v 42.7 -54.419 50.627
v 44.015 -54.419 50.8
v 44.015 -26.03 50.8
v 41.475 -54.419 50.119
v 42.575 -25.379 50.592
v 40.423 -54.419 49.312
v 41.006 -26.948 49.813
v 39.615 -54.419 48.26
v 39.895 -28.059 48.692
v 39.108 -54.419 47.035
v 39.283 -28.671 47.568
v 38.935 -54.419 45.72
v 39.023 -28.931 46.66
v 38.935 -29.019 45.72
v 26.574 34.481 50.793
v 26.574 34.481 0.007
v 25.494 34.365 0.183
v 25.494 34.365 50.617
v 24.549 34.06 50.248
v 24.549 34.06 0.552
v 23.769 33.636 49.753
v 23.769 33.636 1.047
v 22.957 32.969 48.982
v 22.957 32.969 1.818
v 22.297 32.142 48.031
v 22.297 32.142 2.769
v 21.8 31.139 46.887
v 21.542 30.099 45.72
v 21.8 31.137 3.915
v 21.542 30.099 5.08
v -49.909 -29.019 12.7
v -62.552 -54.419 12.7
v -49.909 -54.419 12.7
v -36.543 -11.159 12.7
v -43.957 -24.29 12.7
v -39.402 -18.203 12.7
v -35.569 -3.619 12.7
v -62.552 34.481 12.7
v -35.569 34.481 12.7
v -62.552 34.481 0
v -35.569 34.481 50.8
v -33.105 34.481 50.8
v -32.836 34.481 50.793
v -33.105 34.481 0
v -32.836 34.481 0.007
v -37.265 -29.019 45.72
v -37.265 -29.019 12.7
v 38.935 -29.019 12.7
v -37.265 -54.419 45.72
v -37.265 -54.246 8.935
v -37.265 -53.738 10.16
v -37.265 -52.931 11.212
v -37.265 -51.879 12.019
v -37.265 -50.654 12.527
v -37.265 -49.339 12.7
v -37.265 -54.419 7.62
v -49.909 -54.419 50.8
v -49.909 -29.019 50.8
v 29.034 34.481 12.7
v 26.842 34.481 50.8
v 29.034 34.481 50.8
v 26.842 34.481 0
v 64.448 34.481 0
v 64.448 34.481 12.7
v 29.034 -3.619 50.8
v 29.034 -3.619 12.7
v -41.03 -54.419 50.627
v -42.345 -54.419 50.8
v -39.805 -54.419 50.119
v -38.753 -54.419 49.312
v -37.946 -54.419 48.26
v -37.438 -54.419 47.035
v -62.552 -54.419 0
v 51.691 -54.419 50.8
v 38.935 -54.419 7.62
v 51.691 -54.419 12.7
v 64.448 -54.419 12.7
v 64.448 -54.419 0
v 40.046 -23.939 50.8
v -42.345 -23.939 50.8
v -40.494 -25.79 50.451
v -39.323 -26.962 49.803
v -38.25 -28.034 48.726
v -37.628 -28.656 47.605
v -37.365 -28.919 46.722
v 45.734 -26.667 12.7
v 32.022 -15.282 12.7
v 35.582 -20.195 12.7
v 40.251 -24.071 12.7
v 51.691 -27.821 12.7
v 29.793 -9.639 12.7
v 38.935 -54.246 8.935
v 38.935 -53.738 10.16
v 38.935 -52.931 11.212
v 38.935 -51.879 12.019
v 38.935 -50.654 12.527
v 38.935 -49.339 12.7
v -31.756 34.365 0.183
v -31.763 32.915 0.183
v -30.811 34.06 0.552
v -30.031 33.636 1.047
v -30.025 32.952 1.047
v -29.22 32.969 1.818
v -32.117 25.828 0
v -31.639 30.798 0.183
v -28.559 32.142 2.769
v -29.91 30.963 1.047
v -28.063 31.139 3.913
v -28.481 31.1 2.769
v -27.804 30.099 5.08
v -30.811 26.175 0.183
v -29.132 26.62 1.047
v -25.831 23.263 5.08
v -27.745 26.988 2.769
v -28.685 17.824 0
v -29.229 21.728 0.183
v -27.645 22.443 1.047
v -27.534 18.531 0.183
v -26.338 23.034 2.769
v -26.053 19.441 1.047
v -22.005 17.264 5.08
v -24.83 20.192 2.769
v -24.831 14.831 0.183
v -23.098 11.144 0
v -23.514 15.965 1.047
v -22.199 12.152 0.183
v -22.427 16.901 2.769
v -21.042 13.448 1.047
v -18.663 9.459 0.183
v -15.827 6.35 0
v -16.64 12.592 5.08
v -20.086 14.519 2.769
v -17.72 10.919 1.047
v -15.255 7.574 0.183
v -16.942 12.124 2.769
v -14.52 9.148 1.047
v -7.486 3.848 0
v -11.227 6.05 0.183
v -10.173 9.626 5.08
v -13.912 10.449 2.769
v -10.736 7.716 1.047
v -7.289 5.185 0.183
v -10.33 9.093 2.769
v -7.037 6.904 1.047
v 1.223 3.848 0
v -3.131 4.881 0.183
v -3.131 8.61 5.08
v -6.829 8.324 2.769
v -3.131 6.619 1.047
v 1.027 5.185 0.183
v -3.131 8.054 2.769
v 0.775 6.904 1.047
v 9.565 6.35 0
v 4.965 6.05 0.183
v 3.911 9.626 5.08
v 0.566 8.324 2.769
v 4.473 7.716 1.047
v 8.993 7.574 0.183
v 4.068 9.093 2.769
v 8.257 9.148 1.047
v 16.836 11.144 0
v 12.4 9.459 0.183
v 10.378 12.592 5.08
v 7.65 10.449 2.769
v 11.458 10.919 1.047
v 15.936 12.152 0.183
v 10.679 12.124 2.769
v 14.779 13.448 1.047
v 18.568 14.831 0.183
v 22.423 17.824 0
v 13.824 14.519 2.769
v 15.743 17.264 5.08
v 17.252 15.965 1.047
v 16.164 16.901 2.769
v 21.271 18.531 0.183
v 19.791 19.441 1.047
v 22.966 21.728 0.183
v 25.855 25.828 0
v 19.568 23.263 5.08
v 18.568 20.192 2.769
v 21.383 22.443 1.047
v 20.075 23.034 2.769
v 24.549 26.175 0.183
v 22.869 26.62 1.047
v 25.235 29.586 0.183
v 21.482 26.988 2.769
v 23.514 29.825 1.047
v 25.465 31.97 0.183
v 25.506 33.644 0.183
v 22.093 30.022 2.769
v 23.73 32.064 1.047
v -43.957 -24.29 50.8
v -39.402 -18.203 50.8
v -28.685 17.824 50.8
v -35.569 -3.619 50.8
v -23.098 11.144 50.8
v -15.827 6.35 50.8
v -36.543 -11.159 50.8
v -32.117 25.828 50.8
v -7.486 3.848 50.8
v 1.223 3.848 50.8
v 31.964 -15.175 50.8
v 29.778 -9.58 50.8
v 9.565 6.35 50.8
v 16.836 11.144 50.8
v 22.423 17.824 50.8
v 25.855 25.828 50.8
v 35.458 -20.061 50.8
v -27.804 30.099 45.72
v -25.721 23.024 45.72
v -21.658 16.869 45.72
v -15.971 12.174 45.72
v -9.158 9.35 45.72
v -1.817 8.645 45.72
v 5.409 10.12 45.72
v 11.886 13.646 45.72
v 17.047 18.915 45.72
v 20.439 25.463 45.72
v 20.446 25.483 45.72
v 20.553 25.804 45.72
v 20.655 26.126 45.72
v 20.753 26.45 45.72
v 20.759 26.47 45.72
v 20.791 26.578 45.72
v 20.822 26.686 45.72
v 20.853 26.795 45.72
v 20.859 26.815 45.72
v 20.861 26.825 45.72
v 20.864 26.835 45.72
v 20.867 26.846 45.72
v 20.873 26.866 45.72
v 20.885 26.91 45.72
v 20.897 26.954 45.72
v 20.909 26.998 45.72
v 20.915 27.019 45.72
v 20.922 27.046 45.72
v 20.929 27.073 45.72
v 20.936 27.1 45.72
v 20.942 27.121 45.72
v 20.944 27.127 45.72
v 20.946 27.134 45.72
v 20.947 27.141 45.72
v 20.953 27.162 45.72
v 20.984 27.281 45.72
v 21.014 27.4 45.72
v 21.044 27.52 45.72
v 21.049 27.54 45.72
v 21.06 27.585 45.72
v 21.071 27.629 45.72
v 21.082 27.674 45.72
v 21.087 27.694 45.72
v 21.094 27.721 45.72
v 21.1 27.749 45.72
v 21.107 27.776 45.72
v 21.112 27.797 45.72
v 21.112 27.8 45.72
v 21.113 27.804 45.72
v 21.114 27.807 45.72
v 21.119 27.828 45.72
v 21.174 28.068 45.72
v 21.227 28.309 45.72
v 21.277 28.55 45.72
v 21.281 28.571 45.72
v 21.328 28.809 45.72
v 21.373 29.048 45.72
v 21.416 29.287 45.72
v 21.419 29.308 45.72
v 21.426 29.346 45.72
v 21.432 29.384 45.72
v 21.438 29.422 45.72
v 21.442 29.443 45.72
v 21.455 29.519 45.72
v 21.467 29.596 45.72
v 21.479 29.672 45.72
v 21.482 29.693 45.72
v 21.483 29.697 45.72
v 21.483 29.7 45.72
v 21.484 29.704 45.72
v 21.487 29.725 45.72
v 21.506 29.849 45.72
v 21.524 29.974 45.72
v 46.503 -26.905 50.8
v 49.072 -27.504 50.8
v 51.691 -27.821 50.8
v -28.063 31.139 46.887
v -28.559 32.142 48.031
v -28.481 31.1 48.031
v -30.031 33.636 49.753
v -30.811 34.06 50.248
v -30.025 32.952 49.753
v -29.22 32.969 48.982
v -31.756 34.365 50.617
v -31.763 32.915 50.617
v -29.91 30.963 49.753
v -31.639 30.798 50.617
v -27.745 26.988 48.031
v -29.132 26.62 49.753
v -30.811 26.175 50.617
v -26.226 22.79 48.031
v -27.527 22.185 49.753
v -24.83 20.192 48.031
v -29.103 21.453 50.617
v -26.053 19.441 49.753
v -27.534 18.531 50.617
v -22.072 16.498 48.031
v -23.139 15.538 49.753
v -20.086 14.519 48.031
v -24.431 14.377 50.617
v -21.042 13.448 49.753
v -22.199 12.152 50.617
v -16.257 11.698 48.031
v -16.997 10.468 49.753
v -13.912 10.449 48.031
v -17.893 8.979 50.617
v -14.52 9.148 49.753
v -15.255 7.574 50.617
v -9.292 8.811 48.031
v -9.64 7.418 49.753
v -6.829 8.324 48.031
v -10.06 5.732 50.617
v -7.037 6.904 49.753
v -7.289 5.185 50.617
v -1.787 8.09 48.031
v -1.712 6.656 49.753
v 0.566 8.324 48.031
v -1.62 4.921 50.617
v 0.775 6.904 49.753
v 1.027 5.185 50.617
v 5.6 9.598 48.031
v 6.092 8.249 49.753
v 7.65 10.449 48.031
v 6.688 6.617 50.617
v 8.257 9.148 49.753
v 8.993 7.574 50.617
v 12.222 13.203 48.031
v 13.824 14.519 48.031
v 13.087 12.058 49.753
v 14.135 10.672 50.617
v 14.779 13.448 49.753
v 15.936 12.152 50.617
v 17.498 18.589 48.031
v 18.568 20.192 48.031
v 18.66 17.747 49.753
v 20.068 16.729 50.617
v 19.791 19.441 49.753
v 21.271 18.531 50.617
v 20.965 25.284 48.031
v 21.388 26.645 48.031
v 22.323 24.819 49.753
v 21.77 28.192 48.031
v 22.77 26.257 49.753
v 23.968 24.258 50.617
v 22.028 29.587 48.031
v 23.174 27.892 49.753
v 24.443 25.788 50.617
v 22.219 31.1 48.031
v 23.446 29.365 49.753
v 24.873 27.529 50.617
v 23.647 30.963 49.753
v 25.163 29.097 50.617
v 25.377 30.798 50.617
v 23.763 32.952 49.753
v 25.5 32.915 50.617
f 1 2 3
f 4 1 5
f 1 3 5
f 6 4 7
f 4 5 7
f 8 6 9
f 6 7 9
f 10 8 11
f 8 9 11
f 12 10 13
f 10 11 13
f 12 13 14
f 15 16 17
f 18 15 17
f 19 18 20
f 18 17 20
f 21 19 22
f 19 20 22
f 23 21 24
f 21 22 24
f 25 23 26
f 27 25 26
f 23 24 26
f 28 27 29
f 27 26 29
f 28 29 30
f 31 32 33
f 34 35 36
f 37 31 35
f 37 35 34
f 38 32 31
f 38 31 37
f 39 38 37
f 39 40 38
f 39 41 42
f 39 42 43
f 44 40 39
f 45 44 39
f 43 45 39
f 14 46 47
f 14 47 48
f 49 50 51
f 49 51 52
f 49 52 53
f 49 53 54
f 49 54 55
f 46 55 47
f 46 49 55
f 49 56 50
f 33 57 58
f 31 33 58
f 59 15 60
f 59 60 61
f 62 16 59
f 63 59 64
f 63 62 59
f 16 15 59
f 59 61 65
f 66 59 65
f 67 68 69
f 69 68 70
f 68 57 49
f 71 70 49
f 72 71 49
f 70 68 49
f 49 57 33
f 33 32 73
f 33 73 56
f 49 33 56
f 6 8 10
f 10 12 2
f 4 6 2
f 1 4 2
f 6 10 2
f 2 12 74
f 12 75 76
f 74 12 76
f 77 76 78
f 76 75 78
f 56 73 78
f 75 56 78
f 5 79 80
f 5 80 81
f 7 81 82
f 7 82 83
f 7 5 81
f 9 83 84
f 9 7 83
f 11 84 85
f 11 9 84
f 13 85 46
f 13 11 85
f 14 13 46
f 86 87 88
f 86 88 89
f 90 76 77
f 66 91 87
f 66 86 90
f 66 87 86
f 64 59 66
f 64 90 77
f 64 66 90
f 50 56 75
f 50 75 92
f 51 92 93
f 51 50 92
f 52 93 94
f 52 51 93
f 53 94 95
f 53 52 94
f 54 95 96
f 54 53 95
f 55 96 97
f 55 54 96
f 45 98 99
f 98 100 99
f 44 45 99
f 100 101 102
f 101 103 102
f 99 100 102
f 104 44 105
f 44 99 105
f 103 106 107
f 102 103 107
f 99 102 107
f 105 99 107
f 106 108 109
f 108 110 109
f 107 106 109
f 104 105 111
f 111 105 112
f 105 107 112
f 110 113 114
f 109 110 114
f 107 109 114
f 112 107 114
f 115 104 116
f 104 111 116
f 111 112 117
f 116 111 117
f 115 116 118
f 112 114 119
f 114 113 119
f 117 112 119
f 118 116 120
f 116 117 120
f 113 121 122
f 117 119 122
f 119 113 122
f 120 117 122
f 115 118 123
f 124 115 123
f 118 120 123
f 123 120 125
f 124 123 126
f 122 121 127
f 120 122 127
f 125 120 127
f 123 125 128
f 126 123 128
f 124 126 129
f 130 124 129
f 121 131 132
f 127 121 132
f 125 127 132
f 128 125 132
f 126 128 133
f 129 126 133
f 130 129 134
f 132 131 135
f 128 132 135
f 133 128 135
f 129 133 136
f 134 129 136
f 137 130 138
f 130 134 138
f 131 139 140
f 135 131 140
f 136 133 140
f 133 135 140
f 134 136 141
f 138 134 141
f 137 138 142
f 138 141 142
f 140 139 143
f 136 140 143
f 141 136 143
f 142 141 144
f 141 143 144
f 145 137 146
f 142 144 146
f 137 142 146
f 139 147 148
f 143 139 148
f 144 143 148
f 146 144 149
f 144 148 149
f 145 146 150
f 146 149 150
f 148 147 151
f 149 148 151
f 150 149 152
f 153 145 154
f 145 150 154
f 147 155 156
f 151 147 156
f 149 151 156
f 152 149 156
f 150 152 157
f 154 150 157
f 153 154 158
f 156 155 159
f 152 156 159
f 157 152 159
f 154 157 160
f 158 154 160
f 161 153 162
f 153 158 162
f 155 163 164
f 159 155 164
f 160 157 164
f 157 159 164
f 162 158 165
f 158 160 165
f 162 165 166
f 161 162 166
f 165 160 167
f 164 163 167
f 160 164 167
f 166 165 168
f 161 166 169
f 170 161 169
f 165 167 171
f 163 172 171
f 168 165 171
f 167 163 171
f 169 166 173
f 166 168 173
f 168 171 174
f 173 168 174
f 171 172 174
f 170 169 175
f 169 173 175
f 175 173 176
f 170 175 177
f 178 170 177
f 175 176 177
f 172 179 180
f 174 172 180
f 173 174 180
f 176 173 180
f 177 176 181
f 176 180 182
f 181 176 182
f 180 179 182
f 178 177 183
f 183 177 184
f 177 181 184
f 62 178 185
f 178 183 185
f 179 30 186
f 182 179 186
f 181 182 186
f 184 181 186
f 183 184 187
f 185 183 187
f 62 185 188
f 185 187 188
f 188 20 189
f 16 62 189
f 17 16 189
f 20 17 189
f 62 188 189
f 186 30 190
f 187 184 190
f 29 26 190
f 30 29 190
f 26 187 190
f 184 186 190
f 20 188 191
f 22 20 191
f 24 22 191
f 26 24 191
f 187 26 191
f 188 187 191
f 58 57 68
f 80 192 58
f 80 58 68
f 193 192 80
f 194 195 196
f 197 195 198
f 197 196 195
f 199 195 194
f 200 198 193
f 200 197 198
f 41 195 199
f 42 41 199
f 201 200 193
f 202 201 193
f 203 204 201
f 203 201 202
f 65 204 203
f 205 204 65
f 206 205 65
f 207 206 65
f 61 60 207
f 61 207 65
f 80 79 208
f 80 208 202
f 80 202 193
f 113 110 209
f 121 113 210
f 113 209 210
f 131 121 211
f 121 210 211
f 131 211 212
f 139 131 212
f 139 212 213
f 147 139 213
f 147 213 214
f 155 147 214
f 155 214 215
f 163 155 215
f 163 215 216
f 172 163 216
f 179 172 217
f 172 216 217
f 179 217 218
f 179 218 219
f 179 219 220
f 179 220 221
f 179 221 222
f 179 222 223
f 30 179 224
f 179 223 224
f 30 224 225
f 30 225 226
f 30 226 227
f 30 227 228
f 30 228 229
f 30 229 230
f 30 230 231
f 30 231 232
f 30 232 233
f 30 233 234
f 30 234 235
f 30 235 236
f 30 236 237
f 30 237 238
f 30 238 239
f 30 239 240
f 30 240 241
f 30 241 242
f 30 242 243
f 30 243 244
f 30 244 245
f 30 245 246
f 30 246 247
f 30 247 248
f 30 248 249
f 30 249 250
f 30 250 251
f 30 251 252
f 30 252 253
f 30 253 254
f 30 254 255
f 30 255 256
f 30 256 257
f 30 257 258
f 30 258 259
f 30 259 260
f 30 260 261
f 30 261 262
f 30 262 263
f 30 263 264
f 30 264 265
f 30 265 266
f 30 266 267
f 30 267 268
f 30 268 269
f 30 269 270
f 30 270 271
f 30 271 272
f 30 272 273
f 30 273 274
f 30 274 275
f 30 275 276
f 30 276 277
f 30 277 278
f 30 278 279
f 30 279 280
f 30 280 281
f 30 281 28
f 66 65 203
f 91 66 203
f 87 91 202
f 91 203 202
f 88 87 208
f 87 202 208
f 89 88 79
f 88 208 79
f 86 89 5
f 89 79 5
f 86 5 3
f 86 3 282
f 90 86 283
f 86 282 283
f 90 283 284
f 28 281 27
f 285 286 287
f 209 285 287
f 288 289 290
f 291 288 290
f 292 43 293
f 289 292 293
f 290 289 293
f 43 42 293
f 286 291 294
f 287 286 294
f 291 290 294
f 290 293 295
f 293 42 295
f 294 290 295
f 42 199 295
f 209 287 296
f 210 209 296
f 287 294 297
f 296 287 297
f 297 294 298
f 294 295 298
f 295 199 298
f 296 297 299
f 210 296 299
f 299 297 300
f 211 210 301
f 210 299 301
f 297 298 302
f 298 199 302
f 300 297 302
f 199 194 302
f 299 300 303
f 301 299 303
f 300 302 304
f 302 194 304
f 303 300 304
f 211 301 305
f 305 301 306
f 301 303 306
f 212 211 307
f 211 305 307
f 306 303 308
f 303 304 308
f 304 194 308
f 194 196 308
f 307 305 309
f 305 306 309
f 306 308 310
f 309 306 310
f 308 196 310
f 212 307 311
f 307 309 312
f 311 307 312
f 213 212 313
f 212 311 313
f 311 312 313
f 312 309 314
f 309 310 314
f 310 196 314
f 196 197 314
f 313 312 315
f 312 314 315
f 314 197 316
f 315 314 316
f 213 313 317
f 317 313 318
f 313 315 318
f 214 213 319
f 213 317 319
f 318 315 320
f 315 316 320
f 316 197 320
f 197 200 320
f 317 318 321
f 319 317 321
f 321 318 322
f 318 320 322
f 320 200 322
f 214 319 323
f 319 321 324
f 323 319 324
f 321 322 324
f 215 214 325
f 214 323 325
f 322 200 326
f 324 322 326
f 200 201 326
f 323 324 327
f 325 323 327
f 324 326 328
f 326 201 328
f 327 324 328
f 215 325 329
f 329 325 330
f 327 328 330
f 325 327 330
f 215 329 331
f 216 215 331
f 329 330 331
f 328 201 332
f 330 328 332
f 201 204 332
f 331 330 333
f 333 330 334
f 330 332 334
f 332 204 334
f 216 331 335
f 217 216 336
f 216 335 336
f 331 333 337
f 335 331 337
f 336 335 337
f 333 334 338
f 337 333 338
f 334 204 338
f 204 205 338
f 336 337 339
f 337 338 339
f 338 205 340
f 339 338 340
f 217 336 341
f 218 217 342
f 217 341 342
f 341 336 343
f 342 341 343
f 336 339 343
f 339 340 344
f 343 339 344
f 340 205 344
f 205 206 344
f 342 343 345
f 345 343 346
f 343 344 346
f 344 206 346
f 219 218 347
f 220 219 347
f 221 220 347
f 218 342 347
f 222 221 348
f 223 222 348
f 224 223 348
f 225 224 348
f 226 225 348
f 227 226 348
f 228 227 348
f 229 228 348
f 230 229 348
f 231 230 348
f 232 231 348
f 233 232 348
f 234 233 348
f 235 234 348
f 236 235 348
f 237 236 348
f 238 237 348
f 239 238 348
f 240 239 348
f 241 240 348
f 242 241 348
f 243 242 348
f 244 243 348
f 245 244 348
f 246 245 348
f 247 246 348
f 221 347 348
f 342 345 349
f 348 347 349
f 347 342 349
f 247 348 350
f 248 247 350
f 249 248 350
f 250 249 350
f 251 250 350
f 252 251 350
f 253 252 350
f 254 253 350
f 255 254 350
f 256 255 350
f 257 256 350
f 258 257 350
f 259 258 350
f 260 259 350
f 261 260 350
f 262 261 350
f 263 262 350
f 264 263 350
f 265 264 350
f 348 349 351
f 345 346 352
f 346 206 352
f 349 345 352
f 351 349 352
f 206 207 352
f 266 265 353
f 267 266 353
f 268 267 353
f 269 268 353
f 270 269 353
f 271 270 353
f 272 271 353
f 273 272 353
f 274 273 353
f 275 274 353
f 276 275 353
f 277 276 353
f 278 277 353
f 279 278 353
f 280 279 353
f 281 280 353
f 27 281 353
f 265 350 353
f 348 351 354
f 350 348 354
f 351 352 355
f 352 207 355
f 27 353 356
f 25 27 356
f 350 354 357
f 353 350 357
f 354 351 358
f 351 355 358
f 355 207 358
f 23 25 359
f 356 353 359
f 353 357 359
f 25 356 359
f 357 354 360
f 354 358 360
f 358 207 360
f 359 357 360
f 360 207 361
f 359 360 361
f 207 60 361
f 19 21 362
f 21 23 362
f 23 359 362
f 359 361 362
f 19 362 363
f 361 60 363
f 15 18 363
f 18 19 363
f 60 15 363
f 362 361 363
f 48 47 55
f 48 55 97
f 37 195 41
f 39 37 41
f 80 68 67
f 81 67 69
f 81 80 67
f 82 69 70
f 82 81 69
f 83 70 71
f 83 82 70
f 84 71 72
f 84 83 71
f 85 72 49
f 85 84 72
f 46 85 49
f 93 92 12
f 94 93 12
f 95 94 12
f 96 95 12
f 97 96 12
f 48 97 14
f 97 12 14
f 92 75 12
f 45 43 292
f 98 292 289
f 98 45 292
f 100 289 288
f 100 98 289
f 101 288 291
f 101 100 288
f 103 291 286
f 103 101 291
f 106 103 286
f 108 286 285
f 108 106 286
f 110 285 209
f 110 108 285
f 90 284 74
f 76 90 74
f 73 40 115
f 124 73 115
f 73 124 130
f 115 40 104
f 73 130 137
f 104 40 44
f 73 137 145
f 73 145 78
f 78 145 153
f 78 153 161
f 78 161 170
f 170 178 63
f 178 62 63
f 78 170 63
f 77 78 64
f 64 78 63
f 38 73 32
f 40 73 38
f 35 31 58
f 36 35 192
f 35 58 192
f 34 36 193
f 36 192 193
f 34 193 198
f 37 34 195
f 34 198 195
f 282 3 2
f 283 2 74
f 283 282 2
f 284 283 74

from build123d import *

# Parameters (mm, degrees)
F0_W         = 127
F0_H         = 88.9
F1_DEPTH     = 50.8
F3_DEPTH     = 76.2
F4_W         = 76.2
F4_H         = 25.4
F5_DEPTH     = 38.1
F7_DEPTH     = 38.1
F8_T1_DEPTH  = 76.2
F8_T3_DEPTH  = 38.1
F8_T5_DEPTH  = 74.8723933942
F8_T8_ANGLE  = 242.9501193557
F8_T10_ANGLE = 242.9501193557
F8_T15_DEPTH = 38.1
F8_S16_R     = 24.2542650998
F8_T17_DEPTH = 21
F8_T21_DEPTH = 88.9
F8_S22_R     = 24.2542650998
F8_T23_DEPTH = 46
F8_T30_DEPTH = 88.9
F8_S32_R     = 29.6655396369
F8_T33_DEPTH = 46
F8_T36_DEPTH = 38.1
F8_S38_R     = 29.6655396369
F8_T39_DEPTH = 21


# Not quite as in the source:
# - a fillet or chamfer that OpenCascade refuses, or shapes differently, is made with other operations: its cross-section is extruded or revolved along the edge and cut away or added


with BuildPart() as f1:
    # F0 (on Top) → F1 (new body)
    with BuildSketch(Plane.XY):
        with Locations((0.947636019, -9.969078747)):
            Rectangle(F0_W, F0_H)
    extrude(amount=F1_DEPTH)

    # F2 (on face) → F3 (cut)
    with BuildSketch(Plane.XY.offset(50.8)):
        with BuildLine():
            Line((21.7591244727, 34.480921253), (-28.0215628445, 34.480921253))
            ThreePointArc((-28.0215628445, 34.480921253), (-3.1312191859, 8.6101276845), (21.7591244727, 34.480921253))
        make_face()
    extrude(amount=-F3_DEPTH, mode=Mode.SUBTRACT)

    # F4 (on face) → F5 (cut)
    with BuildSketch(Plane.XY.offset(50.8)):
        with Locations((0.8347104251, -41.719078747)):
            Rectangle(F4_W, F4_H)
    extrude(amount=-F5_DEPTH, mode=Mode.SUBTRACT)

    # F6 (on face) → F7 (cut)
    with BuildSketch(Plane.XY.offset(50.8)):
        with BuildLine():
            Line((-62.552363981, -54.419078747), (-49.9088267779, -54.419078747))
            Line((-49.9088267779, -54.419078747), (-49.9088267779, -29.019078747))
            ThreePointArc((-49.9088267779, -29.019078747), (-39.401677619, -18.2031822516), (-35.5692207813, -3.619078747))
            Line((-35.5692207813, -3.619078747), (-35.5692207813, 34.480921253))
            Line((-35.5692207813, 34.480921253), (-62.552363981, 34.480921253))
            Line((-62.552363981, 34.480921253), (-62.552363981, -54.419078747))
        make_face()
        with BuildLine():
            Line((51.6911732221, -27.8206840158), (51.6911732221, -54.419078747))
            Line((51.6911732221, -54.419078747), (64.447636019, -54.419078747))
            Line((64.447636019, -54.419078747), (64.447636019, 34.480921253))
            Line((64.447636019, 34.480921253), (29.0343053639, 34.480921253))
            Line((29.0343053639, 34.480921253), (29.0343053639, -3.619078747))
            ThreePointArc((29.0343053639, -3.619078747), (35.5824546884, -20.1950505038), (51.6911732221, -27.8206840158))
        make_face()
    extrude(amount=-F7_DEPTH, mode=Mode.SUBTRACT)

    # F8: fillet of radius 5.08 on 8 edges, made by hand

    # F8_s2 → F8_t1 (cut)
    with BuildSketch(Plane.YZ.offset(-37.2652895749)):
        with BuildLine():
            ThreePointArc((-23.939078747, 50.8), (-27.5311811954, 49.3121024484), (-29.019078747, 45.72))
            Line((-29.019078747, 45.72), (-29.019078747, 50.8))
            Line((-29.019078747, 50.8), (-23.939078747, 50.8))
        make_face()
        with BuildLine():
            ThreePointArc((-54.419078747, 7.62), (-52.9311811954, 11.2121024484), (-49.339078747, 12.7))
            Line((-49.339078747, 12.7), (-54.419078747, 12.7))
            Line((-54.419078747, 12.7), (-54.419078747, 7.62))
        make_face()
    extrude(amount=F8_T1_DEPTH, mode=Mode.SUBTRACT)

    # F8_s4 → F8_t3 (cut)
    with BuildSketch(Plane.XZ.offset(29.019078747)):
        with BuildLine():
            ThreePointArc((-42.3452895749, 50.8), (-38.7531871264, 49.3121024484), (-37.2652895749, 45.72))
            Line((-37.2652895749, 45.72), (-37.2652895749, 50.8))
            Line((-37.2652895749, 50.8), (-42.3452895749, 50.8))
        make_face()
        with BuildLine():
            ThreePointArc((44.0147104251, 50.8), (40.4226079767, 49.3121024484), (38.9347104251, 45.72))
            Line((38.9347104251, 45.72), (38.9347104251, 50.8))
            Line((38.9347104251, 50.8), (44.0147104251, 50.8))
        make_face()
    extrude(amount=F8_T3_DEPTH, mode=Mode.SUBTRACT)

    # F8_s6 → F8_t5 (cut)
    with BuildSketch(Plane.XY.offset(-12.0361966971)):
        with BuildLine():
            ThreePointArc((26.5736031516, 34.480921253), (23.2372411895, 33.2317291127), (21.5417284952, 30.0985152915))
            ThreePointArc((21.5417284952, 30.0985152915), (21.7471113974, 32.2849220687), (21.7591244727, 34.480921253))
            Line((21.7591244727, 34.480921253), (26.5736031516, 34.480921253))
        make_face()
        with BuildLine():
            ThreePointArc((-32.8360415234, 34.480921253), (-29.4996795612, 33.2317291127), (-27.804166867, 30.0985152915))
            ThreePointArc((-27.804166867, 30.0985152915), (-28.0095497691, 32.2849220687), (-28.0215628445, 34.480921253))
            Line((-28.0215628445, 34.480921253), (-32.8360415234, 34.480921253))
        make_face()
    extrude(amount=F8_T5_DEPTH, mode=Mode.SUBTRACT)

    # F8_s7 → F8_t8 (revolve, cut)
    with BuildSketch(Plane(origin=(14.0725928873, 22.9868383553, 0), x_dir=(0, 0, 1), z_dir=(0.5221273689, 0.8528675224, 0))):
        with BuildLine():
            ThreePointArc((45.72, -45.0806506369), (49.3121024484, -46.5685481884), (50.8, -50.1606506369))
            Line((50.8, -50.1606506369), (50.8, -45.0806506369))
            Line((50.8, -45.0806506369), (45.72, -45.0806506369))
        make_face()
    revolve(axis=Axis((-3.1312191859, 33.5190498615, 50.8), (0, 0, 1)), revolution_arc=F8_T8_ANGLE, mode=Mode.SUBTRACT)

    # F8_s9 → F8_t10 (revolve, cut)
    with BuildSketch(Plane(origin=(14.0725928873, 22.9868383553, 0), x_dir=(0, 0, 1), z_dir=(0.5221273689, 0.8528675224, 0))):
        with BuildLine():
            ThreePointArc((0, -50.1606506369), (1.4878975516, -46.5685481884), (5.08, -45.0806506369))
            Line((5.08, -45.0806506369), (0, -45.0806506369))
            Line((0, -45.0806506369), (0, -50.1606506369))
        make_face()
    revolve(axis=Axis((-3.1312191859, 33.5190498615, 0), (0, 0, 1)), revolution_arc=F8_T10_ANGLE, mode=Mode.SUBTRACT)


with BuildPart() as f8_tool13:
    # F8_s14 → F8_t15 (new body)
    with BuildSketch(Plane.XZ.offset(54.419078747)):
        with BuildLine():
            ThreePointArc((44.0147104251, 50.8), (40.4226079767, 49.3121024484), (38.9347104251, 45.72))
            Line((38.9347104251, 45.72), (38.9347104251, 50.8))
            Line((38.9347104251, 50.8), (44.0147104251, 50.8))
        make_face()
    extrude(amount=-F8_T15_DEPTH)

    # F8_s16 → F8_t17 (cut, symmetric)
    with BuildSketch(Plane.XY.offset(48.3)):
        with Locations((53.2885704637, -3.619078747)):
            Circle(F8_S16_R)
    extrude(amount=F8_T17_DEPTH, both=True, mode=Mode.SUBTRACT)

    split(bisect_by=Plane.XZ.offset(29.019078747), keep=Keep.BOTTOM)


with BuildPart() as f8_tool19:
    # F8_s20 → F8_t21 (new body)
    with BuildSketch(Plane.YZ.offset(51.6347104251)):
        with BuildLine():
            ThreePointArc((-23.939078747, 50.8), (-27.5311811954, 49.3121024484), (-29.019078747, 45.72))
            Line((-29.019078747, 45.72), (-29.019078747, 50.8))
            Line((-29.019078747, 50.8), (-23.939078747, 50.8))
        make_face()
    extrude(amount=-F8_T21_DEPTH)

    # F8_s22 → F8_t23 (cut, symmetric)
    with BuildSketch(Plane.XY.offset(48.3)):
        with Locations((53.2885704637, -3.619078747)):
            Circle(F8_S22_R)
    extrude(amount=F8_T23_DEPTH, both=True, mode=Mode.SUBTRACT)

    split(bisect_by=Plane.YZ.offset(38.9347104251), keep=Keep.TOP)


with BuildPart() as f8_tool13_1:
    add(f8_tool13.part)

    # F8_t25: intersect F8_tool19
    add(f8_tool19.part, mode=Mode.INTERSECT)


with BuildPart() as f1_1:
    add(f1.part)

    # F8_t11: cut F8_tool13
    add(f8_tool13_1.part, mode=Mode.SUBTRACT)


with BuildPart() as f8_tool28:
    # F8_s29 → F8_t30 (new body)
    with BuildSketch(Plane.YZ.offset(38.9347104251)):
        with BuildLine():
            ThreePointArc((-23.939078747, 50.8), (-27.5311811954, 49.3121024484), (-29.019078747, 45.72))
            Line((-29.019078747, 45.72), (-29.019078747, 50.8))
            Line((-29.019078747, 50.8), (-23.939078747, 50.8))
        make_face()
    extrude(amount=-F8_T30_DEPTH)

    split(bisect_by=Plane.YZ.offset(-37.2652895749), keep=Keep.BOTTOM)

    # F8_s32 → F8_t33 (cut, symmetric)
    with BuildSketch(Plane.XY.offset(48.3)):
        with Locations((-65.2347604182, -3.619078747)):
            Circle(F8_S32_R)
    extrude(amount=F8_T33_DEPTH, both=True, mode=Mode.SUBTRACT)


with BuildPart() as f8_tool34:
    # F8_s35 → F8_t36 (new body)
    with BuildSketch(Plane.XZ.offset(16.319078747)):
        with BuildLine():
            ThreePointArc((-42.3452895749, 50.8), (-38.7531871264, 49.3121024484), (-37.2652895749, 45.72))
            Line((-37.2652895749, 45.72), (-37.2652895749, 50.8))
            Line((-37.2652895749, 50.8), (-42.3452895749, 50.8))
        make_face()
    extrude(amount=F8_T36_DEPTH)

    split(bisect_by=Plane.XZ.offset(29.019078747), keep=Keep.BOTTOM)

    # F8_s38 → F8_t39 (cut, symmetric)
    with BuildSketch(Plane.XY.offset(48.3)):
        with Locations((-65.2347604182, -3.619078747)):
            Circle(F8_S38_R)
    extrude(amount=F8_T39_DEPTH, both=True, mode=Mode.SUBTRACT)


with BuildPart() as f8_tool28_1:
    add(f8_tool28.part)

    # F8_t40: intersect F8_tool34
    add(f8_tool34.part, mode=Mode.INTERSECT)


with BuildPart() as f1_2:
    add(f1_1.part)

    # F8_t26: cut F8_tool28
    add(f8_tool28_1.part, mode=Mode.SUBTRACT)


solid = f1_2.part
